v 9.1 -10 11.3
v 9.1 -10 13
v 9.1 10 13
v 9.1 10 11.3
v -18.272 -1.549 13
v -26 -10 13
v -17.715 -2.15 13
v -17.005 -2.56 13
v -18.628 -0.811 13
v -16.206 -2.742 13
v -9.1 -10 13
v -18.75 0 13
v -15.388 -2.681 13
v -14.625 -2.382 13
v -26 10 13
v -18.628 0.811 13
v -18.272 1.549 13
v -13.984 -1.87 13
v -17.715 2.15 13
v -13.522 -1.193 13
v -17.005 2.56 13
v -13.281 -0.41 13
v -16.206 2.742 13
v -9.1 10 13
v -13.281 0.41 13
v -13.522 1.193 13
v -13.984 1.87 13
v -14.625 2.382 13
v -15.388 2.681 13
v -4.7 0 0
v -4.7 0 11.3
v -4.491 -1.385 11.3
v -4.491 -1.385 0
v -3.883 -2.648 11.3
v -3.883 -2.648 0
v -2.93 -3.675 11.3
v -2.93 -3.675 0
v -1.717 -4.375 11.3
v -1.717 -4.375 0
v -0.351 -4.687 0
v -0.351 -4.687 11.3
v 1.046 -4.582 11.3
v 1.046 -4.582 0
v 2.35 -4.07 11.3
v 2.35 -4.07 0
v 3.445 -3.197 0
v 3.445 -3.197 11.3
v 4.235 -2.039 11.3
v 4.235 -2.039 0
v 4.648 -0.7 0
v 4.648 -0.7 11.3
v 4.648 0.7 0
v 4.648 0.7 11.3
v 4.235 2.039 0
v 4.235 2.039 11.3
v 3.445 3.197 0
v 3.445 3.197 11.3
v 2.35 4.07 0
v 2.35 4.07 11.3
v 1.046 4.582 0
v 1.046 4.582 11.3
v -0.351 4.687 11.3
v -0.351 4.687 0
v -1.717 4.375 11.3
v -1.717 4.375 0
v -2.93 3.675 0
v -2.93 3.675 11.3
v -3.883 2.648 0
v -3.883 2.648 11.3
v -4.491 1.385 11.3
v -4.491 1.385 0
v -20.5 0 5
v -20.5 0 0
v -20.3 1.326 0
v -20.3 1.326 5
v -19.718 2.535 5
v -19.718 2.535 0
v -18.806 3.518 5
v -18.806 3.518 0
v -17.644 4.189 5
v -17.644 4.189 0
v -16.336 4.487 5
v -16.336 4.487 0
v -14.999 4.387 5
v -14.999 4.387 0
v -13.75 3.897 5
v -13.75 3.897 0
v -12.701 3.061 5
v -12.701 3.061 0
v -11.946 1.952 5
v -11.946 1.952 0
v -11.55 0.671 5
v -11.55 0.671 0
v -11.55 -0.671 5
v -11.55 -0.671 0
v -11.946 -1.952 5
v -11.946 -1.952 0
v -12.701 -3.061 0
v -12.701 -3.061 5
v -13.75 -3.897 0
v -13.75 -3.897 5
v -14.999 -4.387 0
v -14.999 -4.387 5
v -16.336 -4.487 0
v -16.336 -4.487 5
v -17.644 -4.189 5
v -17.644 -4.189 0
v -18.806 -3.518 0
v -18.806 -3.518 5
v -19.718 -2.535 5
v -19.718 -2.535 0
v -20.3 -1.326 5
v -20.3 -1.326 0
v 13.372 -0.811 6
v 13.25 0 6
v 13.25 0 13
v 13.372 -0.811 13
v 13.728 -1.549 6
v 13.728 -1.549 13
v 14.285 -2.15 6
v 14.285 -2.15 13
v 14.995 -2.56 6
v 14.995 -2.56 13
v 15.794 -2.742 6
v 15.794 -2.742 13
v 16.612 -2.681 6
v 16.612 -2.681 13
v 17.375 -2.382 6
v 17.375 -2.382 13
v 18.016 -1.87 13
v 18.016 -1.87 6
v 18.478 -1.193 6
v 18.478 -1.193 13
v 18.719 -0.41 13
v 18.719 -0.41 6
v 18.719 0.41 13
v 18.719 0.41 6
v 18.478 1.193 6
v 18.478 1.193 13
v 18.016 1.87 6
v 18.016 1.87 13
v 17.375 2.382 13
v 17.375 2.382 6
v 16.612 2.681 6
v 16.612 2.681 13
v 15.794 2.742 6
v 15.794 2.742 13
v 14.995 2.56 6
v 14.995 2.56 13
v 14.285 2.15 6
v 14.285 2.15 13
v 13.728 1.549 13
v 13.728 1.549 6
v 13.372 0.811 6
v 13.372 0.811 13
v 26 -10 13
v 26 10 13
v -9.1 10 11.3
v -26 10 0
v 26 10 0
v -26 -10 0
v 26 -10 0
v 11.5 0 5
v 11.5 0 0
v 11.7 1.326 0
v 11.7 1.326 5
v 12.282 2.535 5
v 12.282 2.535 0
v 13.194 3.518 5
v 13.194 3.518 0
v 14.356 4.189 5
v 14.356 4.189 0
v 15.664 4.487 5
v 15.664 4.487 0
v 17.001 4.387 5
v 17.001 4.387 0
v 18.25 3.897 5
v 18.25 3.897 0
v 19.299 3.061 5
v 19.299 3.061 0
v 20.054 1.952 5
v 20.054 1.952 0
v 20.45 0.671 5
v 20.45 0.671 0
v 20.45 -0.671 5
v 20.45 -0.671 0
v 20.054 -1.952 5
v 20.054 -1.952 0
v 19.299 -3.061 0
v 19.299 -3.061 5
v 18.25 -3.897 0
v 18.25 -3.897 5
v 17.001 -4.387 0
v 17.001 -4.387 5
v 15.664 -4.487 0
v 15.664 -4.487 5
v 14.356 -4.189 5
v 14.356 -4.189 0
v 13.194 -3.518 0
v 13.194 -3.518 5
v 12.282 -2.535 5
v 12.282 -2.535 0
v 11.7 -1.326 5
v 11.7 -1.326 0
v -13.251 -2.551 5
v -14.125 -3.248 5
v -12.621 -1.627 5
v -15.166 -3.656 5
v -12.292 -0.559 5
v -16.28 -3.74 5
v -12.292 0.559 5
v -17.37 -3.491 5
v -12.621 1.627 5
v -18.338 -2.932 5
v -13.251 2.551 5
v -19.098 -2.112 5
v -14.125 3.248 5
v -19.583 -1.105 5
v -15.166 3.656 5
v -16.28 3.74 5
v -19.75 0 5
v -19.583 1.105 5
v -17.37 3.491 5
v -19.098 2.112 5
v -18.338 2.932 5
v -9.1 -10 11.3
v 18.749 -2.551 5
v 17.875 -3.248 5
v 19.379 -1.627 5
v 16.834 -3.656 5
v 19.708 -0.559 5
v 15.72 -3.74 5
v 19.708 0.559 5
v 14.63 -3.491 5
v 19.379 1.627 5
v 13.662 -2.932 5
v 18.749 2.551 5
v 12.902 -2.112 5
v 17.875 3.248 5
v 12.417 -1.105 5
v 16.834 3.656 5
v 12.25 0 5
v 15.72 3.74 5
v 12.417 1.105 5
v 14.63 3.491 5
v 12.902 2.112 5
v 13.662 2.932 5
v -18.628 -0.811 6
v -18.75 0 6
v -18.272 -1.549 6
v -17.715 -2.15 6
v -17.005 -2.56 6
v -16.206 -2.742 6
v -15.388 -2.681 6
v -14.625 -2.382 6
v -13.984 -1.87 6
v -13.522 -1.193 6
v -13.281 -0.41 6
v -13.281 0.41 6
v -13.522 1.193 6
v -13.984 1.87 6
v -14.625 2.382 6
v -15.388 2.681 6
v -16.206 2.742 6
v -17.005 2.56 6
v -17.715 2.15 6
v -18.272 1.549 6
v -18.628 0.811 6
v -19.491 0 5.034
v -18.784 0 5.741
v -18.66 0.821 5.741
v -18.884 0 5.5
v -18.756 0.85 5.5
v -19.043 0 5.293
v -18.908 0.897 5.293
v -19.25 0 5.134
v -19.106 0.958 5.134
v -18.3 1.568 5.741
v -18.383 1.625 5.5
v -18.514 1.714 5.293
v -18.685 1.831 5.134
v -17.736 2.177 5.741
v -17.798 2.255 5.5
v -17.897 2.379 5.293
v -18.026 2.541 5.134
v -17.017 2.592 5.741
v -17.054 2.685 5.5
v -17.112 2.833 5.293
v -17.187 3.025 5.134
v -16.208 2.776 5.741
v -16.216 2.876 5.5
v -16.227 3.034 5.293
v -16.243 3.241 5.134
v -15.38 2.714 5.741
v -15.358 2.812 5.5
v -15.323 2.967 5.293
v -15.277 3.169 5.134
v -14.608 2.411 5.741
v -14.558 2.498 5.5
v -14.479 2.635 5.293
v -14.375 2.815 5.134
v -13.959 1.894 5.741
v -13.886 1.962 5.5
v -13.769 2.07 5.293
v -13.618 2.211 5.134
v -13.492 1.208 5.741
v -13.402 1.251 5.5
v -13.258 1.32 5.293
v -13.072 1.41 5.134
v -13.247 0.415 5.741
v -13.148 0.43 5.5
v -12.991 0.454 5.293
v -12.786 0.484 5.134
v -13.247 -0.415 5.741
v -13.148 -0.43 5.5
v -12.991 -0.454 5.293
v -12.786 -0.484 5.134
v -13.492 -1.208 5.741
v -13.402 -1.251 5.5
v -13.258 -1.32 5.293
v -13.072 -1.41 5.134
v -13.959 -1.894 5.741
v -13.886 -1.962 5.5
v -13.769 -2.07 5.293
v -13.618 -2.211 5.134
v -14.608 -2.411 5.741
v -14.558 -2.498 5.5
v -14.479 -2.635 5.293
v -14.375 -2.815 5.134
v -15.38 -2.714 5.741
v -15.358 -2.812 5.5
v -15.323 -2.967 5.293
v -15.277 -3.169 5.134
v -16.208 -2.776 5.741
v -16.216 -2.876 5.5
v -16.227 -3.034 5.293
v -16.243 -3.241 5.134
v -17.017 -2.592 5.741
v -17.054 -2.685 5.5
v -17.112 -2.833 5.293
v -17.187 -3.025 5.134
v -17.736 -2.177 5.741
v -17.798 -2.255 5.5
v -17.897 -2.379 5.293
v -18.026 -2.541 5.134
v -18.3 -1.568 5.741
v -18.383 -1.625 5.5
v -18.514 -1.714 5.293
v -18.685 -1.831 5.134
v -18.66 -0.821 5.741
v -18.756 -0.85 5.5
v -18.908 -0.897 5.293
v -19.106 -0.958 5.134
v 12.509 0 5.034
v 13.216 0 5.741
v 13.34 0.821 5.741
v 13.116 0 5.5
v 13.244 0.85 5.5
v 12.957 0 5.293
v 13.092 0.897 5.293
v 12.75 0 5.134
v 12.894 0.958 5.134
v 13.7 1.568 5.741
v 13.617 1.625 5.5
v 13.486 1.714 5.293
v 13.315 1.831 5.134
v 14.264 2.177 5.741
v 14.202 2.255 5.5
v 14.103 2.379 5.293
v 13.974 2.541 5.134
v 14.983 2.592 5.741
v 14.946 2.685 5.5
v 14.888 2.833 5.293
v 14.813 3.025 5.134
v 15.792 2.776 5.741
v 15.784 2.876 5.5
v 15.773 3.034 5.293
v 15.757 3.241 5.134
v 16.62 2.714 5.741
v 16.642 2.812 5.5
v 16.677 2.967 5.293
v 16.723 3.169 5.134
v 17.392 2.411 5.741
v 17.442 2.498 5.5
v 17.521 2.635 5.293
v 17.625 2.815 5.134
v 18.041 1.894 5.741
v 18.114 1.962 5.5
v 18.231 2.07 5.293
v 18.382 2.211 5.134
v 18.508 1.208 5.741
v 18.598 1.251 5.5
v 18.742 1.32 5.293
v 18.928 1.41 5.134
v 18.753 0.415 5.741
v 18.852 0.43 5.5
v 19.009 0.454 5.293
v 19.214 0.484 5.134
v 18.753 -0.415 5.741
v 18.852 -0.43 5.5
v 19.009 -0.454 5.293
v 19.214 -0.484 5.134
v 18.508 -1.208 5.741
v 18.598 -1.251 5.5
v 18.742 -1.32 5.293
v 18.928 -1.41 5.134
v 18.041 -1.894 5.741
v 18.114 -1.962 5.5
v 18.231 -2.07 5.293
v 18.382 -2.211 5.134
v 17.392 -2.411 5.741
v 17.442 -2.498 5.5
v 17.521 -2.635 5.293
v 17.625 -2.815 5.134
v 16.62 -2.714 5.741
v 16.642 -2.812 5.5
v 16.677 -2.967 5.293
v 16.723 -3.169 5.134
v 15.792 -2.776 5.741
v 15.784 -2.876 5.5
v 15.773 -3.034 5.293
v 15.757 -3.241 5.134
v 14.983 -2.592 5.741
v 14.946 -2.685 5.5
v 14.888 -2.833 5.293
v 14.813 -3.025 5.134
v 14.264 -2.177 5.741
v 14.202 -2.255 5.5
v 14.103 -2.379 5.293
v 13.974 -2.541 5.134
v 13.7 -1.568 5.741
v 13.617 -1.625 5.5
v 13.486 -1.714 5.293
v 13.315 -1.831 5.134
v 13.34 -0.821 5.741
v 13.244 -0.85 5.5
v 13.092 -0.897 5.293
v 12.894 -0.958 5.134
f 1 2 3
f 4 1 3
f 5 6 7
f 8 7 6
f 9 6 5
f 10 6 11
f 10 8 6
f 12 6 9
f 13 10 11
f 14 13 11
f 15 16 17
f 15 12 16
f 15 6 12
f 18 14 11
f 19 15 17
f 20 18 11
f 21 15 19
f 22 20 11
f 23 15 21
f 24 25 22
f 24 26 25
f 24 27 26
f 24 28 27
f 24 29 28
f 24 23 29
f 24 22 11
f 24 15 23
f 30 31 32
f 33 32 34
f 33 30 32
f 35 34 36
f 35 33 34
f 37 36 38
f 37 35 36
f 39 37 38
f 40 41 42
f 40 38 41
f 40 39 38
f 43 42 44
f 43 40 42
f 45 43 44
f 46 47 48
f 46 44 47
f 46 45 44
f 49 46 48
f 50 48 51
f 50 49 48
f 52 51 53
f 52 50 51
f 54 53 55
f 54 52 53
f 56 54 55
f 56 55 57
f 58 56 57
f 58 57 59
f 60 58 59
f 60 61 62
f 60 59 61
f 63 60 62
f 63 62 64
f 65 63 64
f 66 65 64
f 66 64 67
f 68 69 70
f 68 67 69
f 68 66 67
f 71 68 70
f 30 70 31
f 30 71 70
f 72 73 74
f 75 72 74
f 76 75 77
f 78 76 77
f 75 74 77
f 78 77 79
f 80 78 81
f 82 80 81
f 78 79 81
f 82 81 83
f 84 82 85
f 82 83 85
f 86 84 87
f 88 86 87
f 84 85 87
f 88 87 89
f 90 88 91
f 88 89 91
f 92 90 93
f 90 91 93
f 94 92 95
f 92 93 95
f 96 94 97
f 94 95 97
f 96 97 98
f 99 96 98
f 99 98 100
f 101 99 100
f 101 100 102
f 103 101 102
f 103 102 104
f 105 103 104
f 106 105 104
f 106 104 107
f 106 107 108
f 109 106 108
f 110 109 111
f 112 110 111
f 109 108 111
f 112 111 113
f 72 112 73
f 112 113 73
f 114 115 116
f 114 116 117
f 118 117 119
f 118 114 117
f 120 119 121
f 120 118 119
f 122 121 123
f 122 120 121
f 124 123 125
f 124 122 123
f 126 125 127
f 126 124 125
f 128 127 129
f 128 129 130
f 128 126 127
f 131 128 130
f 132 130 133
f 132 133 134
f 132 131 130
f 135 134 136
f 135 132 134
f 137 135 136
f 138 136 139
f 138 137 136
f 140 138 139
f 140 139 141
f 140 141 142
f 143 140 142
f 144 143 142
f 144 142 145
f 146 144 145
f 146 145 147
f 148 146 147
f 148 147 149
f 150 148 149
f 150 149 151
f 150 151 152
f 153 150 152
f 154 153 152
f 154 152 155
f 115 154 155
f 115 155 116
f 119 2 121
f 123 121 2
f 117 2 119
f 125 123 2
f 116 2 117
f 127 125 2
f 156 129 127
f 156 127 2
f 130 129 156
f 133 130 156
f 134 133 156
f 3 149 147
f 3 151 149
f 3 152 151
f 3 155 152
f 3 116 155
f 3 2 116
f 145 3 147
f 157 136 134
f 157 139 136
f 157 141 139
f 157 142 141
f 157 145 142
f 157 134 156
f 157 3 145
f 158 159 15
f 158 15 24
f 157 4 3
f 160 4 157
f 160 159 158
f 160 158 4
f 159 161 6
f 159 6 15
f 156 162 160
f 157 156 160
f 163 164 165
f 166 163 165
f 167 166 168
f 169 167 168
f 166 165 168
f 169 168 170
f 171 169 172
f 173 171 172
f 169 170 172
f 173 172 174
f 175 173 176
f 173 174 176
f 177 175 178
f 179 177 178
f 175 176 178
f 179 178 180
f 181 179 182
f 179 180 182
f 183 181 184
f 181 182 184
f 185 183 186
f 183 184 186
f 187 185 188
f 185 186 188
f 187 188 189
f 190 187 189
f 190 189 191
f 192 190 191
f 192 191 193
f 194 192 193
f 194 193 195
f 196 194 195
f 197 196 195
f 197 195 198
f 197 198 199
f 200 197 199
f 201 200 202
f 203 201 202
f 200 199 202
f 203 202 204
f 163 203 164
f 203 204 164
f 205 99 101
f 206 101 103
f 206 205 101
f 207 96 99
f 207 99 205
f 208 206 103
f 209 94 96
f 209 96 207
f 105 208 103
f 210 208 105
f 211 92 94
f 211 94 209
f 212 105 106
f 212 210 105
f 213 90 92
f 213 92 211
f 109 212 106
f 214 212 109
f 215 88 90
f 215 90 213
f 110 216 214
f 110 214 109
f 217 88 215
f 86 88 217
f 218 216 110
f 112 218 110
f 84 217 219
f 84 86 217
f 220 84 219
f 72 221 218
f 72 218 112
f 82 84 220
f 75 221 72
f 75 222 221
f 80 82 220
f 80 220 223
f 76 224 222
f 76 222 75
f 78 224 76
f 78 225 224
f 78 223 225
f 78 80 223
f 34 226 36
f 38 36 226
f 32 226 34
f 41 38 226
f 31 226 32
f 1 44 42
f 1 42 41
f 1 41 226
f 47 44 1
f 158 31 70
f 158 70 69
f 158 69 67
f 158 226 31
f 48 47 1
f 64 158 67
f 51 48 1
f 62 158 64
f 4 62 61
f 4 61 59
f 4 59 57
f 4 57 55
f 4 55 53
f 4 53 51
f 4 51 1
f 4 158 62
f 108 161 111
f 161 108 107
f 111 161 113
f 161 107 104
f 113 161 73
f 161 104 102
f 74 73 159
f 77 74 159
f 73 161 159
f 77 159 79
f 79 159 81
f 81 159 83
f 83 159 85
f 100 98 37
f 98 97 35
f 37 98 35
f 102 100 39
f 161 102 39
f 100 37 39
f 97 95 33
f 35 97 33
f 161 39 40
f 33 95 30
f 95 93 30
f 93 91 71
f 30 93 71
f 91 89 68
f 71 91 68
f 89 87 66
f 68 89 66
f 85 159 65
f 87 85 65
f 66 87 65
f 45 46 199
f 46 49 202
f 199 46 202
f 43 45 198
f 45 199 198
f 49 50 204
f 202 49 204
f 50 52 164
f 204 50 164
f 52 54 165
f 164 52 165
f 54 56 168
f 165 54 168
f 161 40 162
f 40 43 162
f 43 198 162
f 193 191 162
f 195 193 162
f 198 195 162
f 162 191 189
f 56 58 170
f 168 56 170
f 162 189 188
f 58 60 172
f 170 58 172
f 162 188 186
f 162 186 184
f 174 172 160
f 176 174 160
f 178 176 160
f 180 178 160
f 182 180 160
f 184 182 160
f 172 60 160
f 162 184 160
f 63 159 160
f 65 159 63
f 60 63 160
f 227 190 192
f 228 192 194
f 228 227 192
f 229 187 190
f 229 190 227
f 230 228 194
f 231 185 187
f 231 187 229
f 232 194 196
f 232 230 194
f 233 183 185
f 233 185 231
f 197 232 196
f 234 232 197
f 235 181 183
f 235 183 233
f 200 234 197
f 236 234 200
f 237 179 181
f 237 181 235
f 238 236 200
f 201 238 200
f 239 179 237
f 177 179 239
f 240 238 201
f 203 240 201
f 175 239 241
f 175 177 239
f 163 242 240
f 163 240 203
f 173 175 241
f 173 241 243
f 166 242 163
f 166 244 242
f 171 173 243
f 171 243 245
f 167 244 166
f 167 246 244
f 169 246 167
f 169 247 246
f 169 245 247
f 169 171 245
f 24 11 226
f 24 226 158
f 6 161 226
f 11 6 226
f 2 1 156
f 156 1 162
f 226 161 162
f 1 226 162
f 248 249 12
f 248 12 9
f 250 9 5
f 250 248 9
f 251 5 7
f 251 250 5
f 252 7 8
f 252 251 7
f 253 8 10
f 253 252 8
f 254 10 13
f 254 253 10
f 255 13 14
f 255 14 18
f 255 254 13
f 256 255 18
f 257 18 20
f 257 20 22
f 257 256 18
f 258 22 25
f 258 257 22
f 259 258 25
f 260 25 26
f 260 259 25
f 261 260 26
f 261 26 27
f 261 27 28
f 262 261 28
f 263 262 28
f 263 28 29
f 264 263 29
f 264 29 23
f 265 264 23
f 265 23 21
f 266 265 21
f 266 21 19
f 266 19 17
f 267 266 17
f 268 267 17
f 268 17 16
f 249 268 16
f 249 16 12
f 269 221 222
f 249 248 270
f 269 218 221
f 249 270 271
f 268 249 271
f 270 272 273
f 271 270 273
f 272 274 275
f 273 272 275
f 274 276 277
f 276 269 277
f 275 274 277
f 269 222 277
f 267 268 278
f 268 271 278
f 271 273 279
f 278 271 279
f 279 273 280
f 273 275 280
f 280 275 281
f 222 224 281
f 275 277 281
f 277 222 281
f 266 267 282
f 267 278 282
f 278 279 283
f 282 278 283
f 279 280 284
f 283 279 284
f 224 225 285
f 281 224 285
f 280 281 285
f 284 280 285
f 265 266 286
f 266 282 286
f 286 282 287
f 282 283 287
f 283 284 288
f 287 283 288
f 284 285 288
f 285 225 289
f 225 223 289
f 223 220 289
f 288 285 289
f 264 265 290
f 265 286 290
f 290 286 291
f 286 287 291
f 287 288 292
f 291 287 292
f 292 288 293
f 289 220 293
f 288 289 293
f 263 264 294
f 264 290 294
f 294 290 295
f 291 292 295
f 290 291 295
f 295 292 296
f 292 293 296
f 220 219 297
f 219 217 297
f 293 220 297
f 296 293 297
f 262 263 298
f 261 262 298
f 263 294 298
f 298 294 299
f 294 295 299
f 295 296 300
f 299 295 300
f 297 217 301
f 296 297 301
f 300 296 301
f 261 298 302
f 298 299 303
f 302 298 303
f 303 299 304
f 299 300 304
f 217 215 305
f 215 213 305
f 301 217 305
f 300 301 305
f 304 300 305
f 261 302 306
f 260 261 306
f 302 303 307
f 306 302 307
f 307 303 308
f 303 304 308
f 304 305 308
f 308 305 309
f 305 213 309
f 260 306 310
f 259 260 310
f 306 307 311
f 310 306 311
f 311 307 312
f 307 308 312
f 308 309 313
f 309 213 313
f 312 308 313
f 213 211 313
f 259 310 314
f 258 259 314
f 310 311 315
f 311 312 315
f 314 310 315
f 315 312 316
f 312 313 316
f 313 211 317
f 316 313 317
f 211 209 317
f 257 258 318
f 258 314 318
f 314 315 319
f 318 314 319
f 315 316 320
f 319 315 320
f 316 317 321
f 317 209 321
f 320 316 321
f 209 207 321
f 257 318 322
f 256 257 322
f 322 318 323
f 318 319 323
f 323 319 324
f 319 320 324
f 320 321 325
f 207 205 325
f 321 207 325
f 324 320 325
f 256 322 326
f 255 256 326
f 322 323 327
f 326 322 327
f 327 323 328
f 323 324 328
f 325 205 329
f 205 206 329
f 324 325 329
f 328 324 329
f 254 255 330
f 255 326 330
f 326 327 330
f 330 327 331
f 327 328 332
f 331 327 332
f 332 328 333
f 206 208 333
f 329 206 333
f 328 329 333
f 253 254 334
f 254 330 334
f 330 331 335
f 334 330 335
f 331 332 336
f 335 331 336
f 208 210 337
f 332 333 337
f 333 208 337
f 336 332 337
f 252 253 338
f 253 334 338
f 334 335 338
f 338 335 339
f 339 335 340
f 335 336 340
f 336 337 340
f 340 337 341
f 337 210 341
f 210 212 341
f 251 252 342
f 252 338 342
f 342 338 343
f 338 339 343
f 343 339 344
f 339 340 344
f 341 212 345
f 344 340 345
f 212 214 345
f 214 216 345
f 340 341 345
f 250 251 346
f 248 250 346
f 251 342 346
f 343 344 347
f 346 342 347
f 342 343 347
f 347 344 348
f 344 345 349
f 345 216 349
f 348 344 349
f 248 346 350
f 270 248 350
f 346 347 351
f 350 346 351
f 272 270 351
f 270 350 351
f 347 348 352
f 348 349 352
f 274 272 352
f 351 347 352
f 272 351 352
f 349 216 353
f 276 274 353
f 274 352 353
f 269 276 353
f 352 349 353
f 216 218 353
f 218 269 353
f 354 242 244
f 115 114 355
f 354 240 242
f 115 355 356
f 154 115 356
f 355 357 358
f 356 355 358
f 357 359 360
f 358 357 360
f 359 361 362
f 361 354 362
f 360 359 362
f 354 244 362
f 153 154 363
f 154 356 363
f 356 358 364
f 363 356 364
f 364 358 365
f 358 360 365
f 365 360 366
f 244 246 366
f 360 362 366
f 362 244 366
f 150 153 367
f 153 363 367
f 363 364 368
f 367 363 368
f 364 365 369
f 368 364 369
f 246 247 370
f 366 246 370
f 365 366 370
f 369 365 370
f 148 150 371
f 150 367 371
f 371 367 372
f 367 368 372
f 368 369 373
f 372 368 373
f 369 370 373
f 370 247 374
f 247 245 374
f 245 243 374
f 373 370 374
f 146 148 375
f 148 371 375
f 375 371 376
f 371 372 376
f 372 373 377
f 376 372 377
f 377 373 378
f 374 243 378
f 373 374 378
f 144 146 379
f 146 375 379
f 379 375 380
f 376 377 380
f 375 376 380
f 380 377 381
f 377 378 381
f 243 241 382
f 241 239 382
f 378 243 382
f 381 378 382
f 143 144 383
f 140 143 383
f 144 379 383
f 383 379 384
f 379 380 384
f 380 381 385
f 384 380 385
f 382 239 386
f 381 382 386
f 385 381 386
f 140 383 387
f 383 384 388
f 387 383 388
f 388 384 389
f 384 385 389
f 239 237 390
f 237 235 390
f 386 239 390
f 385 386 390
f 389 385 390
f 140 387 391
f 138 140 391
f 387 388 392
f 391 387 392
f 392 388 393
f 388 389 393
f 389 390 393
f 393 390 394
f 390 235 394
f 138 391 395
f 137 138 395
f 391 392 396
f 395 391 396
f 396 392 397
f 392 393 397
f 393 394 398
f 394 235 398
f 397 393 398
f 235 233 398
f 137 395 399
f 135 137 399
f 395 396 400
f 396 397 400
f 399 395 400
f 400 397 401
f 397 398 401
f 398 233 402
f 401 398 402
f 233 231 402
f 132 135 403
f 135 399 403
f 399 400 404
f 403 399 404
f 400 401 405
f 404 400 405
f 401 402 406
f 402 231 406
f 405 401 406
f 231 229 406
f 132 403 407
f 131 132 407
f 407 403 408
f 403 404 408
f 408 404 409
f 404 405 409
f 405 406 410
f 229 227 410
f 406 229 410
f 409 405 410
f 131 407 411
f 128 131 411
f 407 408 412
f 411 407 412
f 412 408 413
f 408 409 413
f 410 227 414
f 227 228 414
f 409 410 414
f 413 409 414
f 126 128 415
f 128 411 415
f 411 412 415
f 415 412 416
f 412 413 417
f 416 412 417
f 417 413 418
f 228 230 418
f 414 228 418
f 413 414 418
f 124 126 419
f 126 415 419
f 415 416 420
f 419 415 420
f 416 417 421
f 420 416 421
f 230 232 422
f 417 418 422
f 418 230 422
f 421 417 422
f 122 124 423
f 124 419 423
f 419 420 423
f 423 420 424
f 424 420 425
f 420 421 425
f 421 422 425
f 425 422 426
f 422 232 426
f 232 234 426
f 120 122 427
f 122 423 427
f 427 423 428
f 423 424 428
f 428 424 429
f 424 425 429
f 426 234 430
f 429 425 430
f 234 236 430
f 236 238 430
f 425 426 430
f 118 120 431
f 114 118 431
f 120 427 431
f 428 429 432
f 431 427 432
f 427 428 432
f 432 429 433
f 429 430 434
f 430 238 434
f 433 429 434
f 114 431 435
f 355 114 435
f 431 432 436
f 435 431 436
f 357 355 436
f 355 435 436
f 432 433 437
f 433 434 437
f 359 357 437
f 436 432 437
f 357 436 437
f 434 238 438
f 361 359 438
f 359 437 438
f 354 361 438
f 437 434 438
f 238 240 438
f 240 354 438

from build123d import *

# Parameters (mm, degrees)
SKETCH_1_W          = 52
SKETCH_1_H          = 20
SKETCH_1_R          = 2.75
SKETCH_1_R_2        = 4.7
EXTRUDE_1_DEPTH     = 13
SKETCH_2_R          = 4.5
CUT_EXTRUDE_1_DEPTH = 5
SKETCH_3_W          = 18.2
SKETCH_3_H          = 20
CUT_EXTRUDE_2_DEPTH = 1.7
FILLET_1_R          = 1


with BuildPart() as part:
    # 草图1 → 凸台-拉伸1 (new body)
    with BuildSketch(Plane.XY):
        Rectangle(SKETCH_1_W, SKETCH_1_H)
        with Locations(Location((-16, 0, 0), (0, 0, 180))):
            Circle(SKETCH_1_R, mode=Mode.SUBTRACT)
        with Locations(Location((16, 0, 0), (0, 0, 180))):
            Circle(SKETCH_1_R, mode=Mode.SUBTRACT)
        with Locations(Location((0, 0, 0), (0, 0, 180))):
            Circle(SKETCH_1_R_2, mode=Mode.SUBTRACT)
    extrude(amount=EXTRUDE_1_DEPTH)

    # 草图2 → 切除-拉伸1 (cut)
    with BuildSketch(Plane(origin=(0, 0, 0), x_dir=(-1, 0, 0), z_dir=(0, 0, -1))):
        with Locations((-16, 0)):
            Circle(SKETCH_2_R)
        with Locations((16, 0)):
            Circle(SKETCH_2_R)
    extrude(amount=-CUT_EXTRUDE_1_DEPTH, mode=Mode.SUBTRACT)

    # 草图3 → 切除-拉伸2 (cut)
    with BuildSketch(Plane.XY.offset(13)):
        Rectangle(SKETCH_3_W, SKETCH_3_H)
    extrude(amount=-CUT_EXTRUDE_2_DEPTH, mode=Mode.SUBTRACT)

    # 圆角1
    fillet_1_edges = [part.edges().sort_by_distance(p)[0] for p in [
        (18.75, 0, 5),
        (-13.25, 0, 5),
    ]]
    fillet(fillet_1_edges, radius=FILLET_1_R)


solid = part.part
